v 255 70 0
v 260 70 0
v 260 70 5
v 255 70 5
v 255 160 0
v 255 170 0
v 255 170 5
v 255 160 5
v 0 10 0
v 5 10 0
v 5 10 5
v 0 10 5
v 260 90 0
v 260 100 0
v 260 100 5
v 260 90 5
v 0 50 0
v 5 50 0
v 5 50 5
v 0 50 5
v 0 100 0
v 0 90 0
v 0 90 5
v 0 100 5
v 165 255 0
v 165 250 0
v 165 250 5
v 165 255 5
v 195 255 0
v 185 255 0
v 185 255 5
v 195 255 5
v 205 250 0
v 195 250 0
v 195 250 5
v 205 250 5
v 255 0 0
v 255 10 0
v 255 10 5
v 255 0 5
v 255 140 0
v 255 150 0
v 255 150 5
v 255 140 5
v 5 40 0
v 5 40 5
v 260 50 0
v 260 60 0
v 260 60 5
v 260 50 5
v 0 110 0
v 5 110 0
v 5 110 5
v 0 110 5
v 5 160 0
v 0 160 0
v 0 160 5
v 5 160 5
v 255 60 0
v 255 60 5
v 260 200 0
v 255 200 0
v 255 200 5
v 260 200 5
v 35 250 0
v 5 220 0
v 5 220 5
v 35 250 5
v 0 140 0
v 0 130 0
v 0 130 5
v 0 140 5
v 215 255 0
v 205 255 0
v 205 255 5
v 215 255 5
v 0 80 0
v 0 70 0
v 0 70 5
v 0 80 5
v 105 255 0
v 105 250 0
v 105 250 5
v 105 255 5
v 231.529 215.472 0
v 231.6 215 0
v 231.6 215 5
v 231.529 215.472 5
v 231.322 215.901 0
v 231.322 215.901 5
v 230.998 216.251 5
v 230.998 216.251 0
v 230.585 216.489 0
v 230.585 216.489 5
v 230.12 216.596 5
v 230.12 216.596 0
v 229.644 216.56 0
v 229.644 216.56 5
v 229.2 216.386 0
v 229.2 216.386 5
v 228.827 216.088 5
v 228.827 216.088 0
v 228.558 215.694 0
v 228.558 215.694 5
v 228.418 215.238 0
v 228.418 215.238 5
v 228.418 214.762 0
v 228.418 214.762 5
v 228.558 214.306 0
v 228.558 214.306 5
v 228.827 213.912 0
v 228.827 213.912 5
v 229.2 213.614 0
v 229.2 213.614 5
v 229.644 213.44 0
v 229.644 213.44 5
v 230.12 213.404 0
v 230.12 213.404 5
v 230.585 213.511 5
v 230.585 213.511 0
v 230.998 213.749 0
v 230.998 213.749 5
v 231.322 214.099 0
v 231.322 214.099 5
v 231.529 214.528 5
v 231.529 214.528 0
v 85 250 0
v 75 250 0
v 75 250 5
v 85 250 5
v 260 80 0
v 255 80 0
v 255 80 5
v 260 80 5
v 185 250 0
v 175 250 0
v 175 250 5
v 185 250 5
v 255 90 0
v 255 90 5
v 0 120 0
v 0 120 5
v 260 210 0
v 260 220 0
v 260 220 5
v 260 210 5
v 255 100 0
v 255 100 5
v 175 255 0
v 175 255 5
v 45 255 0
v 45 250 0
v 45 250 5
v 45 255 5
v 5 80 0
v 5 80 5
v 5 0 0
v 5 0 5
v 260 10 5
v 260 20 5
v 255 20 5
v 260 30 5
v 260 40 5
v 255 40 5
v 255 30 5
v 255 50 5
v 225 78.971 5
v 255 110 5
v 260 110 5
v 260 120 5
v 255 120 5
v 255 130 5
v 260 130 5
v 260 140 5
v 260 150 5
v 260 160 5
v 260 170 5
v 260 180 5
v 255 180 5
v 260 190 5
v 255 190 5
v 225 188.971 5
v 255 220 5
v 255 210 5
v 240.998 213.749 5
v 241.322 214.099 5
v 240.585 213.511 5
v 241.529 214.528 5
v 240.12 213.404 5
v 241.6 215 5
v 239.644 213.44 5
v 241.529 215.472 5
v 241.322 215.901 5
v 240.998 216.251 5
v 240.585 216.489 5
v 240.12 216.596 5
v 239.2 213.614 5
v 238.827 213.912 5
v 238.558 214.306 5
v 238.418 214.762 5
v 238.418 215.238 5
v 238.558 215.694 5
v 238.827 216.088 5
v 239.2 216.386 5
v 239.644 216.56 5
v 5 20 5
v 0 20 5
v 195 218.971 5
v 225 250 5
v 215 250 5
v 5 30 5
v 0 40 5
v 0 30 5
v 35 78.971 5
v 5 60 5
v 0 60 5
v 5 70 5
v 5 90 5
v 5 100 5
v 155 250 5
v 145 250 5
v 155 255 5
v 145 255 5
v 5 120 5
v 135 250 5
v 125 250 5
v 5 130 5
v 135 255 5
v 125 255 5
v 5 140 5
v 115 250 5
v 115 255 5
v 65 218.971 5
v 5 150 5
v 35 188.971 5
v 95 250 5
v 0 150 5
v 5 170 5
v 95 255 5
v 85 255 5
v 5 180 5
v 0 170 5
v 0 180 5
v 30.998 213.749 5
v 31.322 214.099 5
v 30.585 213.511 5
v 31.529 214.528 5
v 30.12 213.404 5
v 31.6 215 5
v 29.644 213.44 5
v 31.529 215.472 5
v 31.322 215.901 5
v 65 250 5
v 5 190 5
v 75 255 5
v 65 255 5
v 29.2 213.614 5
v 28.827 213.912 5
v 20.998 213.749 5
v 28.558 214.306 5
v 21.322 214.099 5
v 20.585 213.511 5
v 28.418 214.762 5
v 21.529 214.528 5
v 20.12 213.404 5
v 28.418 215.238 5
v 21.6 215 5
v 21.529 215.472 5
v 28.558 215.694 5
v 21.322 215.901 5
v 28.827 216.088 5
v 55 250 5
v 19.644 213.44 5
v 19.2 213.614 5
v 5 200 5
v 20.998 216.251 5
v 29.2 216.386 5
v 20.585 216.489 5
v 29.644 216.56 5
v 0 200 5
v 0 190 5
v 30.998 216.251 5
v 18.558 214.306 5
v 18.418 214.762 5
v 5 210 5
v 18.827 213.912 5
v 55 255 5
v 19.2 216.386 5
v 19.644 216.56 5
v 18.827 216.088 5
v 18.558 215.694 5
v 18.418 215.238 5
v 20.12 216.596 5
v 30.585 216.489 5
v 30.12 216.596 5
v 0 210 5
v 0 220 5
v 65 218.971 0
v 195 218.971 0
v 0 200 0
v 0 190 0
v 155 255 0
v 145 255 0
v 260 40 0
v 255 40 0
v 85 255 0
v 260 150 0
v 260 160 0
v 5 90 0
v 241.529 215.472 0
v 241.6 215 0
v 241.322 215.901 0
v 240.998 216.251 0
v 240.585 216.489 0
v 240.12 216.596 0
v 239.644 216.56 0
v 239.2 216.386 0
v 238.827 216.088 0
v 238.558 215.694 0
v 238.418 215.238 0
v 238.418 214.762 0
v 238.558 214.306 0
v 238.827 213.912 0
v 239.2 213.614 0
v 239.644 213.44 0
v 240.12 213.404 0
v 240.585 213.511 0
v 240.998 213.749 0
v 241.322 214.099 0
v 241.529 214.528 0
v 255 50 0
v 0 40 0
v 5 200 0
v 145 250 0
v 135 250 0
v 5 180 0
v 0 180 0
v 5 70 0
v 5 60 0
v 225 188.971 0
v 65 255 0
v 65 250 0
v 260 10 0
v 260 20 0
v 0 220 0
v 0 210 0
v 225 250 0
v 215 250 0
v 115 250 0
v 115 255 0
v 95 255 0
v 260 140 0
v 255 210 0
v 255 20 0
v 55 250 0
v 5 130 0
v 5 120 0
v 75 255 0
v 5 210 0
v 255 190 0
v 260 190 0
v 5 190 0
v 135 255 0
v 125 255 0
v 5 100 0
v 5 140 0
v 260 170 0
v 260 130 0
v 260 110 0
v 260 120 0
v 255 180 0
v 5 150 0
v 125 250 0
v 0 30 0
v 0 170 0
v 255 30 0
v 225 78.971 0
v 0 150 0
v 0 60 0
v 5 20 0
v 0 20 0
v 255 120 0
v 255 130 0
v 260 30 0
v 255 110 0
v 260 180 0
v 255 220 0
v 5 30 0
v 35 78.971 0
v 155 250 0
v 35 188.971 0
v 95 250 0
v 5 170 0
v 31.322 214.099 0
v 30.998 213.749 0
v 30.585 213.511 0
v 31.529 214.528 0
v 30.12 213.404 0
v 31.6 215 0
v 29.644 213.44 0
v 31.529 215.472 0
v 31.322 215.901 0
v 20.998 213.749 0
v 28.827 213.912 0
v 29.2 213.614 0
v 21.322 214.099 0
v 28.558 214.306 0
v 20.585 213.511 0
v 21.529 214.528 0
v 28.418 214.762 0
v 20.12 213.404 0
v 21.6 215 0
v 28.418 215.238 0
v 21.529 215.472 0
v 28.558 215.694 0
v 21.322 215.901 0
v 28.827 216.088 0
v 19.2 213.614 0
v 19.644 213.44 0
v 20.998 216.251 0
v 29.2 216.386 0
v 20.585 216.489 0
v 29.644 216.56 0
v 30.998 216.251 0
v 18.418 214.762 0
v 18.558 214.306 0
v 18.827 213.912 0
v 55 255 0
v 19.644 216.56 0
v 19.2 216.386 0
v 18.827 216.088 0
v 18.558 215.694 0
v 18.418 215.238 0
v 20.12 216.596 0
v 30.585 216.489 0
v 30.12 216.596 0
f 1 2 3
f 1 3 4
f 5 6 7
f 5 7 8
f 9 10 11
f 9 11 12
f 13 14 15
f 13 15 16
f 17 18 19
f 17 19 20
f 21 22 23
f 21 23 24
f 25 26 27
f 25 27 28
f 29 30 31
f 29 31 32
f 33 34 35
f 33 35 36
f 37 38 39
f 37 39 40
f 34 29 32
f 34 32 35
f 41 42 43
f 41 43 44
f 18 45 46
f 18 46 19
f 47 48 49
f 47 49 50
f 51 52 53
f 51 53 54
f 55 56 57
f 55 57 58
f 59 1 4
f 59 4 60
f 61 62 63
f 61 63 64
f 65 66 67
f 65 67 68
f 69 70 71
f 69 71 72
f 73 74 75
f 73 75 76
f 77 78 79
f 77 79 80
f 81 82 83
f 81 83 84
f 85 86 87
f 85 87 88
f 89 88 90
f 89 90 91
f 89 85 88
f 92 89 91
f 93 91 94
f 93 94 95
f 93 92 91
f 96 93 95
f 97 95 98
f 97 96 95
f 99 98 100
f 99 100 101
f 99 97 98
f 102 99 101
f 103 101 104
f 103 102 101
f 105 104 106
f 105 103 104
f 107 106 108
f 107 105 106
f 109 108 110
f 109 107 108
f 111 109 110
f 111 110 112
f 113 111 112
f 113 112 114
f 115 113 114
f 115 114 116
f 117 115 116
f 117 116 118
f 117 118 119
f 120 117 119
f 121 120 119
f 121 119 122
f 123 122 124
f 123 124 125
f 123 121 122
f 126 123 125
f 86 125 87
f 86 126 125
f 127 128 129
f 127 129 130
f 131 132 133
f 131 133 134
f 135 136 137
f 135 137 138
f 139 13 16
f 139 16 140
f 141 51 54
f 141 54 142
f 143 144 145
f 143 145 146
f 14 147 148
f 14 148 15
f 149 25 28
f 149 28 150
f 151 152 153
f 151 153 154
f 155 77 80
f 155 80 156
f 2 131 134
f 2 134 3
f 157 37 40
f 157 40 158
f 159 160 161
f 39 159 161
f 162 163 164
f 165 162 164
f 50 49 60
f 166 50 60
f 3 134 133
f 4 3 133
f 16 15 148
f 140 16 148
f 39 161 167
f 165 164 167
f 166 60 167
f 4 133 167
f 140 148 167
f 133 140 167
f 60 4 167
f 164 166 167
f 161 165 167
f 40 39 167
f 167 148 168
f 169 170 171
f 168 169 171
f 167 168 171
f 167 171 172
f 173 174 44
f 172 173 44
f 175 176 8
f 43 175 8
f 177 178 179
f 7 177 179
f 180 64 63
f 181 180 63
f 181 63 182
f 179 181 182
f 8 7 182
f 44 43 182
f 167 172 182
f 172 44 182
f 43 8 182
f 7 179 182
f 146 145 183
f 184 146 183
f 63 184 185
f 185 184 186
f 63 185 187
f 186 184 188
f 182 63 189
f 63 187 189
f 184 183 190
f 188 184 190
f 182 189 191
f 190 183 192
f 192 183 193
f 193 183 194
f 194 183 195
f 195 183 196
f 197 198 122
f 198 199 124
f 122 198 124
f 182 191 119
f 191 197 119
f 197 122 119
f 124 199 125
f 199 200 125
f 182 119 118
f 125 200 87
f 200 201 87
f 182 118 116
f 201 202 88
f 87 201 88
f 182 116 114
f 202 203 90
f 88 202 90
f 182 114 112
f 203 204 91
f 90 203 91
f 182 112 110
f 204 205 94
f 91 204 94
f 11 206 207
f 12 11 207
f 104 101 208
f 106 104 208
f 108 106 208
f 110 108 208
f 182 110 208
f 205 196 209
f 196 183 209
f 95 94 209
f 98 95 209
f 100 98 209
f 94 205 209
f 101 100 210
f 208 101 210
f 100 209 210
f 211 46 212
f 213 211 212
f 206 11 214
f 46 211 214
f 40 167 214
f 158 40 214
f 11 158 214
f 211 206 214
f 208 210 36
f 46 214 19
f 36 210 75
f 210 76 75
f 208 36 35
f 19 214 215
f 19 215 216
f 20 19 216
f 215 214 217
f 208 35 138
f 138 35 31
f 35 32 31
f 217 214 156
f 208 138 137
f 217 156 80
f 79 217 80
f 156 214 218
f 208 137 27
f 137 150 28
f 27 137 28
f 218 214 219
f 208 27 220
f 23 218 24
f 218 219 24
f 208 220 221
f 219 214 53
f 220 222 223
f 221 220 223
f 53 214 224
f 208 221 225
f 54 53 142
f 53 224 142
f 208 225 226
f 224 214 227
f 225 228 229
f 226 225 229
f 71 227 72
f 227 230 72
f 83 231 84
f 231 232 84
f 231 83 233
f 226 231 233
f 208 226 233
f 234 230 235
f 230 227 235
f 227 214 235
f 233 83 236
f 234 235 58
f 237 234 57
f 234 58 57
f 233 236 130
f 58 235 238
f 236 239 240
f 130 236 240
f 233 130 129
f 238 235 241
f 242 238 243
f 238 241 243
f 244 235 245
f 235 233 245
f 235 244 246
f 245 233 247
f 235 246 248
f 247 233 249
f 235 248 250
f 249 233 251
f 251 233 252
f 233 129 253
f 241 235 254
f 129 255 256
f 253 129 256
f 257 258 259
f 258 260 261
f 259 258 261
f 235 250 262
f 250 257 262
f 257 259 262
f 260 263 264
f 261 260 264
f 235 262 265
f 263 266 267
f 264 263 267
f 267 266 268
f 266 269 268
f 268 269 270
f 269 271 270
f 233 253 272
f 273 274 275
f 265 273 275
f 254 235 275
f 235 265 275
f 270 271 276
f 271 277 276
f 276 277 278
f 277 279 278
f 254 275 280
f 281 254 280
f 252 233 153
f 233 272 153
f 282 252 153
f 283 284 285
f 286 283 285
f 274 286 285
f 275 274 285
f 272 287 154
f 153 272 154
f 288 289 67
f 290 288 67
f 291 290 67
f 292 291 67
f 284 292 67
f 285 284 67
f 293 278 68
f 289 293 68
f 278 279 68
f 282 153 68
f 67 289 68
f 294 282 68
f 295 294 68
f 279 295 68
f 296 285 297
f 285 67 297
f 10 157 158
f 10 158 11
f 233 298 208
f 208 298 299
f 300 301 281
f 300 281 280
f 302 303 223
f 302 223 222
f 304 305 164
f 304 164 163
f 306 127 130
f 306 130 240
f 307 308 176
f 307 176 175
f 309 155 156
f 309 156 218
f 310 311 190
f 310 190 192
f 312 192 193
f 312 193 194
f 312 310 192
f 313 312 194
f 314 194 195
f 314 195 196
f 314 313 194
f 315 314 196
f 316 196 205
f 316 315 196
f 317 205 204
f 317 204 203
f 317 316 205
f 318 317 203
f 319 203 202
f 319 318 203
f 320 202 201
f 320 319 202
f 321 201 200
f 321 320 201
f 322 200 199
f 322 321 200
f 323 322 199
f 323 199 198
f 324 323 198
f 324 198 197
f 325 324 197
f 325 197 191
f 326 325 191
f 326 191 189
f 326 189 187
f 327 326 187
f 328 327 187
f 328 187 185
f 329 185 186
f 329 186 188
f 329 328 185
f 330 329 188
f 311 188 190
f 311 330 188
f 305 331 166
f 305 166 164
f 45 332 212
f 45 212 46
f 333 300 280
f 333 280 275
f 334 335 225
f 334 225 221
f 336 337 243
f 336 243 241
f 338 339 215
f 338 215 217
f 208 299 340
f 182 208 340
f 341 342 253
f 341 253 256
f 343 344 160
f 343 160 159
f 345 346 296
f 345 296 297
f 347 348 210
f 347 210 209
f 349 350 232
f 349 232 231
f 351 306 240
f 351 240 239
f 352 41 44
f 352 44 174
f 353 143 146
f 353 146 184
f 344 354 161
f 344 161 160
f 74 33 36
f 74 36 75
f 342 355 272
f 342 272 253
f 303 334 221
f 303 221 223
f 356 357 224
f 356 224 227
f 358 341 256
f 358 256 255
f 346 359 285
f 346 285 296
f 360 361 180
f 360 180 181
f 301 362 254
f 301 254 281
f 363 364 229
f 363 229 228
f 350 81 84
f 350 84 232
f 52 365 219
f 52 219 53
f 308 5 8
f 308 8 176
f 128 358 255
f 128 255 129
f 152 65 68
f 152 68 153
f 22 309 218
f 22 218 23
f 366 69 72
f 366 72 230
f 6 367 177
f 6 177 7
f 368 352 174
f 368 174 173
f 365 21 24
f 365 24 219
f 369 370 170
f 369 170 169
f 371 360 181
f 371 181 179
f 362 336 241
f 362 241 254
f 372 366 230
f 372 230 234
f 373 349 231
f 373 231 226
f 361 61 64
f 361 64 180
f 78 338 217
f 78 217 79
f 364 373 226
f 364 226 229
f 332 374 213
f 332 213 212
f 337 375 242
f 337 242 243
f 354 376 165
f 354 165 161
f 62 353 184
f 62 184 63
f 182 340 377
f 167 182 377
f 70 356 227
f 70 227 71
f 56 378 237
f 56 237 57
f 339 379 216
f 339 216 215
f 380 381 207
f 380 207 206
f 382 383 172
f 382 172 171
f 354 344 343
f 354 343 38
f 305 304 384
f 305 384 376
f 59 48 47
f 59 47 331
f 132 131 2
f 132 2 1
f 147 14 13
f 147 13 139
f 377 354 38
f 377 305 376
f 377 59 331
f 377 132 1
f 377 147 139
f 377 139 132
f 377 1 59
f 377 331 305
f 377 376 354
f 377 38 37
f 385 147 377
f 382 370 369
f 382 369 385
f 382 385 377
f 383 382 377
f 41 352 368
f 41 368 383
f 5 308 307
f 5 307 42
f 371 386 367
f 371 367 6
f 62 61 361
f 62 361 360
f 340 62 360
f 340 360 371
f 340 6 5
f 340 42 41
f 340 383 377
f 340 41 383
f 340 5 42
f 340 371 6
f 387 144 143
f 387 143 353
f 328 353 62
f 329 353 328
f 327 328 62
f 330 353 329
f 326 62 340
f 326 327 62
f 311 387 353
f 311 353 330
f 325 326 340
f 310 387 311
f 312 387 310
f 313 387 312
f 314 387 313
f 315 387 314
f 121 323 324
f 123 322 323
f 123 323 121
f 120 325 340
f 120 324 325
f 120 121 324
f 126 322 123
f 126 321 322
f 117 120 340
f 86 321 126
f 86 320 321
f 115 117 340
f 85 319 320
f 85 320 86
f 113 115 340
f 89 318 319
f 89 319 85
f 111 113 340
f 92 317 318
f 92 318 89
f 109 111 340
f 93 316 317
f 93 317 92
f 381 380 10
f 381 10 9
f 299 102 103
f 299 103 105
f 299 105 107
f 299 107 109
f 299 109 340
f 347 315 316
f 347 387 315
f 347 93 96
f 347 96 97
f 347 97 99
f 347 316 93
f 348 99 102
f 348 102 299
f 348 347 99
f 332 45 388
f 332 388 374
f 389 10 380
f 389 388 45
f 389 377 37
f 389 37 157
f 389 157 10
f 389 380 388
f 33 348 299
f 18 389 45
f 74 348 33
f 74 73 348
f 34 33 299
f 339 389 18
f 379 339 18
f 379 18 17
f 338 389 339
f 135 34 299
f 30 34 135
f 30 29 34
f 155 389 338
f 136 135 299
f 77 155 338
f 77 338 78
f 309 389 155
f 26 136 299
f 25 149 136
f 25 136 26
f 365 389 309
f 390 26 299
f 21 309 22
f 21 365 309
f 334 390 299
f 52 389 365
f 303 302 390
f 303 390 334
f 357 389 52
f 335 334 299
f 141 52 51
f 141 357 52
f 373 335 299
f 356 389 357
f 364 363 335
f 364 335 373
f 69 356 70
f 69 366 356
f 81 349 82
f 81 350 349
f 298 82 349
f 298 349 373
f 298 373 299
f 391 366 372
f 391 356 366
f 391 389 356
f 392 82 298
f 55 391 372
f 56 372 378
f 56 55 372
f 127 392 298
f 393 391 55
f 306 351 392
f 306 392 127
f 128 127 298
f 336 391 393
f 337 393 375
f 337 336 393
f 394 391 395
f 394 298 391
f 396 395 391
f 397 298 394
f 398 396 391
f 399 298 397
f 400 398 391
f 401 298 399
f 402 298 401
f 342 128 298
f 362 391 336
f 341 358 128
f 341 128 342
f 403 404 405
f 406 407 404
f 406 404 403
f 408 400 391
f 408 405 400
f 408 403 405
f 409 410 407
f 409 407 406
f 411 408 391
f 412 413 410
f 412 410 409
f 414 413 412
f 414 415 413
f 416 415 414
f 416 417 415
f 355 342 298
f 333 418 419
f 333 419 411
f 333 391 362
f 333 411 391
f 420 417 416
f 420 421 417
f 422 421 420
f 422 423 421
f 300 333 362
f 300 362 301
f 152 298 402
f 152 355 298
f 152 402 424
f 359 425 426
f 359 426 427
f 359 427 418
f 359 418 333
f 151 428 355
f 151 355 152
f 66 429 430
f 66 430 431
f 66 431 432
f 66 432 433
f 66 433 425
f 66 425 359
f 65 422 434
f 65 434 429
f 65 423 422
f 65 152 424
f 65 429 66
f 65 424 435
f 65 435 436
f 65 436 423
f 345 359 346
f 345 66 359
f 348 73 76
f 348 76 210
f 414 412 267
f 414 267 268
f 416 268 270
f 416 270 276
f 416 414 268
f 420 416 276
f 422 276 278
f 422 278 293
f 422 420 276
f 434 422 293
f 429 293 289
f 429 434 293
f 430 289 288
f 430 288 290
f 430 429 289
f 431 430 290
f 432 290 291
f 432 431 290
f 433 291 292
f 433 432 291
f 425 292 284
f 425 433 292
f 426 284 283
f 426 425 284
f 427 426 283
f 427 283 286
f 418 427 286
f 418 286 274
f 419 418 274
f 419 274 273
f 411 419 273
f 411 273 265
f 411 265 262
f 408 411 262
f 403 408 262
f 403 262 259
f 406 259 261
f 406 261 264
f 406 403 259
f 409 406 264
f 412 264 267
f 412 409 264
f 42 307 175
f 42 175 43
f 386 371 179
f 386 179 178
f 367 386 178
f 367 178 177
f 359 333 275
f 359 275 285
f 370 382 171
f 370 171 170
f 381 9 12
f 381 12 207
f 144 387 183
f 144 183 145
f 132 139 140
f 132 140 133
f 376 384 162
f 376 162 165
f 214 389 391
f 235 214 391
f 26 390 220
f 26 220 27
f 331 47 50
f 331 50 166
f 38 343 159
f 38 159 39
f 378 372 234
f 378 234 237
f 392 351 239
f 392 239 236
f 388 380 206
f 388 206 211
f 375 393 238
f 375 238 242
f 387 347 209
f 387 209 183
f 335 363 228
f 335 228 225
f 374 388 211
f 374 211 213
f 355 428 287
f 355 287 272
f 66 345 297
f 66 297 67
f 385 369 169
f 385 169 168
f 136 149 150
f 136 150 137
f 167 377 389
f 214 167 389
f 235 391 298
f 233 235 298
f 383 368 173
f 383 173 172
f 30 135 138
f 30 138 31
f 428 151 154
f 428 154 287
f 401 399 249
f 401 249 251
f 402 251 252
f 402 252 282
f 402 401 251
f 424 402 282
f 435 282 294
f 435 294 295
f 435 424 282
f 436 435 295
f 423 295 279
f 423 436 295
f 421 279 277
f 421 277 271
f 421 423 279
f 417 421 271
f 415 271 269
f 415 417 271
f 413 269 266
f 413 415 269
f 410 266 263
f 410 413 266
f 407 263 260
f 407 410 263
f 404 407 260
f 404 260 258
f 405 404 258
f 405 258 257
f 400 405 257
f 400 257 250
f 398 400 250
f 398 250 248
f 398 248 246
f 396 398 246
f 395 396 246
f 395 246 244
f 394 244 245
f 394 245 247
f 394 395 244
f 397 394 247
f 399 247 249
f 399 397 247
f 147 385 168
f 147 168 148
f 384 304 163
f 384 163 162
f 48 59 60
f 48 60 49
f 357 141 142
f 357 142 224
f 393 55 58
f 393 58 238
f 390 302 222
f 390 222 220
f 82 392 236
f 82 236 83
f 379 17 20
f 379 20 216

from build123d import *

# Parameters (mm, degrees)
SKIZZE1_R                       = 1.6
AUFSATZ_LINEAR_AUSTRAGEN1_DEPTH = 5


with BuildPart() as part:
    # Skizze1 → Aufsatz-Linear austragen1 (new body)
    with BuildSketch(Plane.XY):
        Polygon((35, 250), (45, 250), (45, 255), (55, 255), (55, 250), (65, 250), (65, 255), (75, 255), (75, 250), (85, 250), (85, 255), (95, 255), (95, 250), (105, 250), (105, 255), (115, 255), (115, 250), (125, 250), (125, 255), (135, 255), (135, 250), (145, 250), (145, 255), (155, 255), (155, 250), (165, 250), (165, 255), (175, 255), (175, 250), (185, 250), (185, 255), (195, 255), (195, 250), (205, 250), (205, 255), (215, 255), (215, 250), (225, 250), (255, 220), (260, 220), (260, 210), (255, 210), (255, 200), (260, 200), (260, 190), (255, 190), (255, 180), (260, 180), (260, 170), (255, 170), (255, 160), (260, 160), (260, 150), (255, 150), (255, 140), (260, 140), (260, 130), (255, 130), (255, 120), (260, 120), (260, 110), (255, 110), (255, 100), (260, 100), (260, 90), (255, 90), (255, 80), (260, 80), (260, 70), (255, 70), (255, 60), (260, 60), (260, 50), (255, 50), (255, 40), (260, 40), (260, 30), (255, 30), (255, 20), (260, 20), (260, 10), (255, 10), (255, 0), (5, 0), (5, 10), (0, 10), (0, 20), (5, 20), (5, 30), (0, 30), (0, 40), (5, 40), (5, 50), (0, 50), (0, 60), (5, 60), (5, 70), (0, 70), (0, 80), (5, 80), (5, 90), (0, 90), (0, 100), (5, 100), (5, 110), (0, 110), (0, 120), (5, 120), (5, 130), (0, 130), (0, 140), (5, 140), (5, 150), (0, 150), (0, 160), (5, 160), (5, 170), (0, 170), (0, 180), (5, 180), (5, 190), (0, 190), (0, 200), (5, 200), (5, 210), (0, 210), (0, 220), (5, 220), align=None)
        with Locations((20, 215)):
            Circle(SKIZZE1_R, mode=Mode.SUBTRACT)
        with Locations((30, 215)):
            Circle(SKIZZE1_R, mode=Mode.SUBTRACT)
        with Locations((240, 215)):
            Circle(SKIZZE1_R, mode=Mode.SUBTRACT)
        with Locations((230, 215)):
            Circle(SKIZZE1_R, mode=Mode.SUBTRACT)
        Polygon((65, 218.971165398), (195, 218.971165398), (225, 188.971165398), (225, 78.971165398), (35, 78.971165398), (35, 188.971165398), align=None, mode=Mode.SUBTRACT)
    extrude(amount=AUFSATZ_LINEAR_AUSTRAGEN1_DEPTH)


solid = part.part
